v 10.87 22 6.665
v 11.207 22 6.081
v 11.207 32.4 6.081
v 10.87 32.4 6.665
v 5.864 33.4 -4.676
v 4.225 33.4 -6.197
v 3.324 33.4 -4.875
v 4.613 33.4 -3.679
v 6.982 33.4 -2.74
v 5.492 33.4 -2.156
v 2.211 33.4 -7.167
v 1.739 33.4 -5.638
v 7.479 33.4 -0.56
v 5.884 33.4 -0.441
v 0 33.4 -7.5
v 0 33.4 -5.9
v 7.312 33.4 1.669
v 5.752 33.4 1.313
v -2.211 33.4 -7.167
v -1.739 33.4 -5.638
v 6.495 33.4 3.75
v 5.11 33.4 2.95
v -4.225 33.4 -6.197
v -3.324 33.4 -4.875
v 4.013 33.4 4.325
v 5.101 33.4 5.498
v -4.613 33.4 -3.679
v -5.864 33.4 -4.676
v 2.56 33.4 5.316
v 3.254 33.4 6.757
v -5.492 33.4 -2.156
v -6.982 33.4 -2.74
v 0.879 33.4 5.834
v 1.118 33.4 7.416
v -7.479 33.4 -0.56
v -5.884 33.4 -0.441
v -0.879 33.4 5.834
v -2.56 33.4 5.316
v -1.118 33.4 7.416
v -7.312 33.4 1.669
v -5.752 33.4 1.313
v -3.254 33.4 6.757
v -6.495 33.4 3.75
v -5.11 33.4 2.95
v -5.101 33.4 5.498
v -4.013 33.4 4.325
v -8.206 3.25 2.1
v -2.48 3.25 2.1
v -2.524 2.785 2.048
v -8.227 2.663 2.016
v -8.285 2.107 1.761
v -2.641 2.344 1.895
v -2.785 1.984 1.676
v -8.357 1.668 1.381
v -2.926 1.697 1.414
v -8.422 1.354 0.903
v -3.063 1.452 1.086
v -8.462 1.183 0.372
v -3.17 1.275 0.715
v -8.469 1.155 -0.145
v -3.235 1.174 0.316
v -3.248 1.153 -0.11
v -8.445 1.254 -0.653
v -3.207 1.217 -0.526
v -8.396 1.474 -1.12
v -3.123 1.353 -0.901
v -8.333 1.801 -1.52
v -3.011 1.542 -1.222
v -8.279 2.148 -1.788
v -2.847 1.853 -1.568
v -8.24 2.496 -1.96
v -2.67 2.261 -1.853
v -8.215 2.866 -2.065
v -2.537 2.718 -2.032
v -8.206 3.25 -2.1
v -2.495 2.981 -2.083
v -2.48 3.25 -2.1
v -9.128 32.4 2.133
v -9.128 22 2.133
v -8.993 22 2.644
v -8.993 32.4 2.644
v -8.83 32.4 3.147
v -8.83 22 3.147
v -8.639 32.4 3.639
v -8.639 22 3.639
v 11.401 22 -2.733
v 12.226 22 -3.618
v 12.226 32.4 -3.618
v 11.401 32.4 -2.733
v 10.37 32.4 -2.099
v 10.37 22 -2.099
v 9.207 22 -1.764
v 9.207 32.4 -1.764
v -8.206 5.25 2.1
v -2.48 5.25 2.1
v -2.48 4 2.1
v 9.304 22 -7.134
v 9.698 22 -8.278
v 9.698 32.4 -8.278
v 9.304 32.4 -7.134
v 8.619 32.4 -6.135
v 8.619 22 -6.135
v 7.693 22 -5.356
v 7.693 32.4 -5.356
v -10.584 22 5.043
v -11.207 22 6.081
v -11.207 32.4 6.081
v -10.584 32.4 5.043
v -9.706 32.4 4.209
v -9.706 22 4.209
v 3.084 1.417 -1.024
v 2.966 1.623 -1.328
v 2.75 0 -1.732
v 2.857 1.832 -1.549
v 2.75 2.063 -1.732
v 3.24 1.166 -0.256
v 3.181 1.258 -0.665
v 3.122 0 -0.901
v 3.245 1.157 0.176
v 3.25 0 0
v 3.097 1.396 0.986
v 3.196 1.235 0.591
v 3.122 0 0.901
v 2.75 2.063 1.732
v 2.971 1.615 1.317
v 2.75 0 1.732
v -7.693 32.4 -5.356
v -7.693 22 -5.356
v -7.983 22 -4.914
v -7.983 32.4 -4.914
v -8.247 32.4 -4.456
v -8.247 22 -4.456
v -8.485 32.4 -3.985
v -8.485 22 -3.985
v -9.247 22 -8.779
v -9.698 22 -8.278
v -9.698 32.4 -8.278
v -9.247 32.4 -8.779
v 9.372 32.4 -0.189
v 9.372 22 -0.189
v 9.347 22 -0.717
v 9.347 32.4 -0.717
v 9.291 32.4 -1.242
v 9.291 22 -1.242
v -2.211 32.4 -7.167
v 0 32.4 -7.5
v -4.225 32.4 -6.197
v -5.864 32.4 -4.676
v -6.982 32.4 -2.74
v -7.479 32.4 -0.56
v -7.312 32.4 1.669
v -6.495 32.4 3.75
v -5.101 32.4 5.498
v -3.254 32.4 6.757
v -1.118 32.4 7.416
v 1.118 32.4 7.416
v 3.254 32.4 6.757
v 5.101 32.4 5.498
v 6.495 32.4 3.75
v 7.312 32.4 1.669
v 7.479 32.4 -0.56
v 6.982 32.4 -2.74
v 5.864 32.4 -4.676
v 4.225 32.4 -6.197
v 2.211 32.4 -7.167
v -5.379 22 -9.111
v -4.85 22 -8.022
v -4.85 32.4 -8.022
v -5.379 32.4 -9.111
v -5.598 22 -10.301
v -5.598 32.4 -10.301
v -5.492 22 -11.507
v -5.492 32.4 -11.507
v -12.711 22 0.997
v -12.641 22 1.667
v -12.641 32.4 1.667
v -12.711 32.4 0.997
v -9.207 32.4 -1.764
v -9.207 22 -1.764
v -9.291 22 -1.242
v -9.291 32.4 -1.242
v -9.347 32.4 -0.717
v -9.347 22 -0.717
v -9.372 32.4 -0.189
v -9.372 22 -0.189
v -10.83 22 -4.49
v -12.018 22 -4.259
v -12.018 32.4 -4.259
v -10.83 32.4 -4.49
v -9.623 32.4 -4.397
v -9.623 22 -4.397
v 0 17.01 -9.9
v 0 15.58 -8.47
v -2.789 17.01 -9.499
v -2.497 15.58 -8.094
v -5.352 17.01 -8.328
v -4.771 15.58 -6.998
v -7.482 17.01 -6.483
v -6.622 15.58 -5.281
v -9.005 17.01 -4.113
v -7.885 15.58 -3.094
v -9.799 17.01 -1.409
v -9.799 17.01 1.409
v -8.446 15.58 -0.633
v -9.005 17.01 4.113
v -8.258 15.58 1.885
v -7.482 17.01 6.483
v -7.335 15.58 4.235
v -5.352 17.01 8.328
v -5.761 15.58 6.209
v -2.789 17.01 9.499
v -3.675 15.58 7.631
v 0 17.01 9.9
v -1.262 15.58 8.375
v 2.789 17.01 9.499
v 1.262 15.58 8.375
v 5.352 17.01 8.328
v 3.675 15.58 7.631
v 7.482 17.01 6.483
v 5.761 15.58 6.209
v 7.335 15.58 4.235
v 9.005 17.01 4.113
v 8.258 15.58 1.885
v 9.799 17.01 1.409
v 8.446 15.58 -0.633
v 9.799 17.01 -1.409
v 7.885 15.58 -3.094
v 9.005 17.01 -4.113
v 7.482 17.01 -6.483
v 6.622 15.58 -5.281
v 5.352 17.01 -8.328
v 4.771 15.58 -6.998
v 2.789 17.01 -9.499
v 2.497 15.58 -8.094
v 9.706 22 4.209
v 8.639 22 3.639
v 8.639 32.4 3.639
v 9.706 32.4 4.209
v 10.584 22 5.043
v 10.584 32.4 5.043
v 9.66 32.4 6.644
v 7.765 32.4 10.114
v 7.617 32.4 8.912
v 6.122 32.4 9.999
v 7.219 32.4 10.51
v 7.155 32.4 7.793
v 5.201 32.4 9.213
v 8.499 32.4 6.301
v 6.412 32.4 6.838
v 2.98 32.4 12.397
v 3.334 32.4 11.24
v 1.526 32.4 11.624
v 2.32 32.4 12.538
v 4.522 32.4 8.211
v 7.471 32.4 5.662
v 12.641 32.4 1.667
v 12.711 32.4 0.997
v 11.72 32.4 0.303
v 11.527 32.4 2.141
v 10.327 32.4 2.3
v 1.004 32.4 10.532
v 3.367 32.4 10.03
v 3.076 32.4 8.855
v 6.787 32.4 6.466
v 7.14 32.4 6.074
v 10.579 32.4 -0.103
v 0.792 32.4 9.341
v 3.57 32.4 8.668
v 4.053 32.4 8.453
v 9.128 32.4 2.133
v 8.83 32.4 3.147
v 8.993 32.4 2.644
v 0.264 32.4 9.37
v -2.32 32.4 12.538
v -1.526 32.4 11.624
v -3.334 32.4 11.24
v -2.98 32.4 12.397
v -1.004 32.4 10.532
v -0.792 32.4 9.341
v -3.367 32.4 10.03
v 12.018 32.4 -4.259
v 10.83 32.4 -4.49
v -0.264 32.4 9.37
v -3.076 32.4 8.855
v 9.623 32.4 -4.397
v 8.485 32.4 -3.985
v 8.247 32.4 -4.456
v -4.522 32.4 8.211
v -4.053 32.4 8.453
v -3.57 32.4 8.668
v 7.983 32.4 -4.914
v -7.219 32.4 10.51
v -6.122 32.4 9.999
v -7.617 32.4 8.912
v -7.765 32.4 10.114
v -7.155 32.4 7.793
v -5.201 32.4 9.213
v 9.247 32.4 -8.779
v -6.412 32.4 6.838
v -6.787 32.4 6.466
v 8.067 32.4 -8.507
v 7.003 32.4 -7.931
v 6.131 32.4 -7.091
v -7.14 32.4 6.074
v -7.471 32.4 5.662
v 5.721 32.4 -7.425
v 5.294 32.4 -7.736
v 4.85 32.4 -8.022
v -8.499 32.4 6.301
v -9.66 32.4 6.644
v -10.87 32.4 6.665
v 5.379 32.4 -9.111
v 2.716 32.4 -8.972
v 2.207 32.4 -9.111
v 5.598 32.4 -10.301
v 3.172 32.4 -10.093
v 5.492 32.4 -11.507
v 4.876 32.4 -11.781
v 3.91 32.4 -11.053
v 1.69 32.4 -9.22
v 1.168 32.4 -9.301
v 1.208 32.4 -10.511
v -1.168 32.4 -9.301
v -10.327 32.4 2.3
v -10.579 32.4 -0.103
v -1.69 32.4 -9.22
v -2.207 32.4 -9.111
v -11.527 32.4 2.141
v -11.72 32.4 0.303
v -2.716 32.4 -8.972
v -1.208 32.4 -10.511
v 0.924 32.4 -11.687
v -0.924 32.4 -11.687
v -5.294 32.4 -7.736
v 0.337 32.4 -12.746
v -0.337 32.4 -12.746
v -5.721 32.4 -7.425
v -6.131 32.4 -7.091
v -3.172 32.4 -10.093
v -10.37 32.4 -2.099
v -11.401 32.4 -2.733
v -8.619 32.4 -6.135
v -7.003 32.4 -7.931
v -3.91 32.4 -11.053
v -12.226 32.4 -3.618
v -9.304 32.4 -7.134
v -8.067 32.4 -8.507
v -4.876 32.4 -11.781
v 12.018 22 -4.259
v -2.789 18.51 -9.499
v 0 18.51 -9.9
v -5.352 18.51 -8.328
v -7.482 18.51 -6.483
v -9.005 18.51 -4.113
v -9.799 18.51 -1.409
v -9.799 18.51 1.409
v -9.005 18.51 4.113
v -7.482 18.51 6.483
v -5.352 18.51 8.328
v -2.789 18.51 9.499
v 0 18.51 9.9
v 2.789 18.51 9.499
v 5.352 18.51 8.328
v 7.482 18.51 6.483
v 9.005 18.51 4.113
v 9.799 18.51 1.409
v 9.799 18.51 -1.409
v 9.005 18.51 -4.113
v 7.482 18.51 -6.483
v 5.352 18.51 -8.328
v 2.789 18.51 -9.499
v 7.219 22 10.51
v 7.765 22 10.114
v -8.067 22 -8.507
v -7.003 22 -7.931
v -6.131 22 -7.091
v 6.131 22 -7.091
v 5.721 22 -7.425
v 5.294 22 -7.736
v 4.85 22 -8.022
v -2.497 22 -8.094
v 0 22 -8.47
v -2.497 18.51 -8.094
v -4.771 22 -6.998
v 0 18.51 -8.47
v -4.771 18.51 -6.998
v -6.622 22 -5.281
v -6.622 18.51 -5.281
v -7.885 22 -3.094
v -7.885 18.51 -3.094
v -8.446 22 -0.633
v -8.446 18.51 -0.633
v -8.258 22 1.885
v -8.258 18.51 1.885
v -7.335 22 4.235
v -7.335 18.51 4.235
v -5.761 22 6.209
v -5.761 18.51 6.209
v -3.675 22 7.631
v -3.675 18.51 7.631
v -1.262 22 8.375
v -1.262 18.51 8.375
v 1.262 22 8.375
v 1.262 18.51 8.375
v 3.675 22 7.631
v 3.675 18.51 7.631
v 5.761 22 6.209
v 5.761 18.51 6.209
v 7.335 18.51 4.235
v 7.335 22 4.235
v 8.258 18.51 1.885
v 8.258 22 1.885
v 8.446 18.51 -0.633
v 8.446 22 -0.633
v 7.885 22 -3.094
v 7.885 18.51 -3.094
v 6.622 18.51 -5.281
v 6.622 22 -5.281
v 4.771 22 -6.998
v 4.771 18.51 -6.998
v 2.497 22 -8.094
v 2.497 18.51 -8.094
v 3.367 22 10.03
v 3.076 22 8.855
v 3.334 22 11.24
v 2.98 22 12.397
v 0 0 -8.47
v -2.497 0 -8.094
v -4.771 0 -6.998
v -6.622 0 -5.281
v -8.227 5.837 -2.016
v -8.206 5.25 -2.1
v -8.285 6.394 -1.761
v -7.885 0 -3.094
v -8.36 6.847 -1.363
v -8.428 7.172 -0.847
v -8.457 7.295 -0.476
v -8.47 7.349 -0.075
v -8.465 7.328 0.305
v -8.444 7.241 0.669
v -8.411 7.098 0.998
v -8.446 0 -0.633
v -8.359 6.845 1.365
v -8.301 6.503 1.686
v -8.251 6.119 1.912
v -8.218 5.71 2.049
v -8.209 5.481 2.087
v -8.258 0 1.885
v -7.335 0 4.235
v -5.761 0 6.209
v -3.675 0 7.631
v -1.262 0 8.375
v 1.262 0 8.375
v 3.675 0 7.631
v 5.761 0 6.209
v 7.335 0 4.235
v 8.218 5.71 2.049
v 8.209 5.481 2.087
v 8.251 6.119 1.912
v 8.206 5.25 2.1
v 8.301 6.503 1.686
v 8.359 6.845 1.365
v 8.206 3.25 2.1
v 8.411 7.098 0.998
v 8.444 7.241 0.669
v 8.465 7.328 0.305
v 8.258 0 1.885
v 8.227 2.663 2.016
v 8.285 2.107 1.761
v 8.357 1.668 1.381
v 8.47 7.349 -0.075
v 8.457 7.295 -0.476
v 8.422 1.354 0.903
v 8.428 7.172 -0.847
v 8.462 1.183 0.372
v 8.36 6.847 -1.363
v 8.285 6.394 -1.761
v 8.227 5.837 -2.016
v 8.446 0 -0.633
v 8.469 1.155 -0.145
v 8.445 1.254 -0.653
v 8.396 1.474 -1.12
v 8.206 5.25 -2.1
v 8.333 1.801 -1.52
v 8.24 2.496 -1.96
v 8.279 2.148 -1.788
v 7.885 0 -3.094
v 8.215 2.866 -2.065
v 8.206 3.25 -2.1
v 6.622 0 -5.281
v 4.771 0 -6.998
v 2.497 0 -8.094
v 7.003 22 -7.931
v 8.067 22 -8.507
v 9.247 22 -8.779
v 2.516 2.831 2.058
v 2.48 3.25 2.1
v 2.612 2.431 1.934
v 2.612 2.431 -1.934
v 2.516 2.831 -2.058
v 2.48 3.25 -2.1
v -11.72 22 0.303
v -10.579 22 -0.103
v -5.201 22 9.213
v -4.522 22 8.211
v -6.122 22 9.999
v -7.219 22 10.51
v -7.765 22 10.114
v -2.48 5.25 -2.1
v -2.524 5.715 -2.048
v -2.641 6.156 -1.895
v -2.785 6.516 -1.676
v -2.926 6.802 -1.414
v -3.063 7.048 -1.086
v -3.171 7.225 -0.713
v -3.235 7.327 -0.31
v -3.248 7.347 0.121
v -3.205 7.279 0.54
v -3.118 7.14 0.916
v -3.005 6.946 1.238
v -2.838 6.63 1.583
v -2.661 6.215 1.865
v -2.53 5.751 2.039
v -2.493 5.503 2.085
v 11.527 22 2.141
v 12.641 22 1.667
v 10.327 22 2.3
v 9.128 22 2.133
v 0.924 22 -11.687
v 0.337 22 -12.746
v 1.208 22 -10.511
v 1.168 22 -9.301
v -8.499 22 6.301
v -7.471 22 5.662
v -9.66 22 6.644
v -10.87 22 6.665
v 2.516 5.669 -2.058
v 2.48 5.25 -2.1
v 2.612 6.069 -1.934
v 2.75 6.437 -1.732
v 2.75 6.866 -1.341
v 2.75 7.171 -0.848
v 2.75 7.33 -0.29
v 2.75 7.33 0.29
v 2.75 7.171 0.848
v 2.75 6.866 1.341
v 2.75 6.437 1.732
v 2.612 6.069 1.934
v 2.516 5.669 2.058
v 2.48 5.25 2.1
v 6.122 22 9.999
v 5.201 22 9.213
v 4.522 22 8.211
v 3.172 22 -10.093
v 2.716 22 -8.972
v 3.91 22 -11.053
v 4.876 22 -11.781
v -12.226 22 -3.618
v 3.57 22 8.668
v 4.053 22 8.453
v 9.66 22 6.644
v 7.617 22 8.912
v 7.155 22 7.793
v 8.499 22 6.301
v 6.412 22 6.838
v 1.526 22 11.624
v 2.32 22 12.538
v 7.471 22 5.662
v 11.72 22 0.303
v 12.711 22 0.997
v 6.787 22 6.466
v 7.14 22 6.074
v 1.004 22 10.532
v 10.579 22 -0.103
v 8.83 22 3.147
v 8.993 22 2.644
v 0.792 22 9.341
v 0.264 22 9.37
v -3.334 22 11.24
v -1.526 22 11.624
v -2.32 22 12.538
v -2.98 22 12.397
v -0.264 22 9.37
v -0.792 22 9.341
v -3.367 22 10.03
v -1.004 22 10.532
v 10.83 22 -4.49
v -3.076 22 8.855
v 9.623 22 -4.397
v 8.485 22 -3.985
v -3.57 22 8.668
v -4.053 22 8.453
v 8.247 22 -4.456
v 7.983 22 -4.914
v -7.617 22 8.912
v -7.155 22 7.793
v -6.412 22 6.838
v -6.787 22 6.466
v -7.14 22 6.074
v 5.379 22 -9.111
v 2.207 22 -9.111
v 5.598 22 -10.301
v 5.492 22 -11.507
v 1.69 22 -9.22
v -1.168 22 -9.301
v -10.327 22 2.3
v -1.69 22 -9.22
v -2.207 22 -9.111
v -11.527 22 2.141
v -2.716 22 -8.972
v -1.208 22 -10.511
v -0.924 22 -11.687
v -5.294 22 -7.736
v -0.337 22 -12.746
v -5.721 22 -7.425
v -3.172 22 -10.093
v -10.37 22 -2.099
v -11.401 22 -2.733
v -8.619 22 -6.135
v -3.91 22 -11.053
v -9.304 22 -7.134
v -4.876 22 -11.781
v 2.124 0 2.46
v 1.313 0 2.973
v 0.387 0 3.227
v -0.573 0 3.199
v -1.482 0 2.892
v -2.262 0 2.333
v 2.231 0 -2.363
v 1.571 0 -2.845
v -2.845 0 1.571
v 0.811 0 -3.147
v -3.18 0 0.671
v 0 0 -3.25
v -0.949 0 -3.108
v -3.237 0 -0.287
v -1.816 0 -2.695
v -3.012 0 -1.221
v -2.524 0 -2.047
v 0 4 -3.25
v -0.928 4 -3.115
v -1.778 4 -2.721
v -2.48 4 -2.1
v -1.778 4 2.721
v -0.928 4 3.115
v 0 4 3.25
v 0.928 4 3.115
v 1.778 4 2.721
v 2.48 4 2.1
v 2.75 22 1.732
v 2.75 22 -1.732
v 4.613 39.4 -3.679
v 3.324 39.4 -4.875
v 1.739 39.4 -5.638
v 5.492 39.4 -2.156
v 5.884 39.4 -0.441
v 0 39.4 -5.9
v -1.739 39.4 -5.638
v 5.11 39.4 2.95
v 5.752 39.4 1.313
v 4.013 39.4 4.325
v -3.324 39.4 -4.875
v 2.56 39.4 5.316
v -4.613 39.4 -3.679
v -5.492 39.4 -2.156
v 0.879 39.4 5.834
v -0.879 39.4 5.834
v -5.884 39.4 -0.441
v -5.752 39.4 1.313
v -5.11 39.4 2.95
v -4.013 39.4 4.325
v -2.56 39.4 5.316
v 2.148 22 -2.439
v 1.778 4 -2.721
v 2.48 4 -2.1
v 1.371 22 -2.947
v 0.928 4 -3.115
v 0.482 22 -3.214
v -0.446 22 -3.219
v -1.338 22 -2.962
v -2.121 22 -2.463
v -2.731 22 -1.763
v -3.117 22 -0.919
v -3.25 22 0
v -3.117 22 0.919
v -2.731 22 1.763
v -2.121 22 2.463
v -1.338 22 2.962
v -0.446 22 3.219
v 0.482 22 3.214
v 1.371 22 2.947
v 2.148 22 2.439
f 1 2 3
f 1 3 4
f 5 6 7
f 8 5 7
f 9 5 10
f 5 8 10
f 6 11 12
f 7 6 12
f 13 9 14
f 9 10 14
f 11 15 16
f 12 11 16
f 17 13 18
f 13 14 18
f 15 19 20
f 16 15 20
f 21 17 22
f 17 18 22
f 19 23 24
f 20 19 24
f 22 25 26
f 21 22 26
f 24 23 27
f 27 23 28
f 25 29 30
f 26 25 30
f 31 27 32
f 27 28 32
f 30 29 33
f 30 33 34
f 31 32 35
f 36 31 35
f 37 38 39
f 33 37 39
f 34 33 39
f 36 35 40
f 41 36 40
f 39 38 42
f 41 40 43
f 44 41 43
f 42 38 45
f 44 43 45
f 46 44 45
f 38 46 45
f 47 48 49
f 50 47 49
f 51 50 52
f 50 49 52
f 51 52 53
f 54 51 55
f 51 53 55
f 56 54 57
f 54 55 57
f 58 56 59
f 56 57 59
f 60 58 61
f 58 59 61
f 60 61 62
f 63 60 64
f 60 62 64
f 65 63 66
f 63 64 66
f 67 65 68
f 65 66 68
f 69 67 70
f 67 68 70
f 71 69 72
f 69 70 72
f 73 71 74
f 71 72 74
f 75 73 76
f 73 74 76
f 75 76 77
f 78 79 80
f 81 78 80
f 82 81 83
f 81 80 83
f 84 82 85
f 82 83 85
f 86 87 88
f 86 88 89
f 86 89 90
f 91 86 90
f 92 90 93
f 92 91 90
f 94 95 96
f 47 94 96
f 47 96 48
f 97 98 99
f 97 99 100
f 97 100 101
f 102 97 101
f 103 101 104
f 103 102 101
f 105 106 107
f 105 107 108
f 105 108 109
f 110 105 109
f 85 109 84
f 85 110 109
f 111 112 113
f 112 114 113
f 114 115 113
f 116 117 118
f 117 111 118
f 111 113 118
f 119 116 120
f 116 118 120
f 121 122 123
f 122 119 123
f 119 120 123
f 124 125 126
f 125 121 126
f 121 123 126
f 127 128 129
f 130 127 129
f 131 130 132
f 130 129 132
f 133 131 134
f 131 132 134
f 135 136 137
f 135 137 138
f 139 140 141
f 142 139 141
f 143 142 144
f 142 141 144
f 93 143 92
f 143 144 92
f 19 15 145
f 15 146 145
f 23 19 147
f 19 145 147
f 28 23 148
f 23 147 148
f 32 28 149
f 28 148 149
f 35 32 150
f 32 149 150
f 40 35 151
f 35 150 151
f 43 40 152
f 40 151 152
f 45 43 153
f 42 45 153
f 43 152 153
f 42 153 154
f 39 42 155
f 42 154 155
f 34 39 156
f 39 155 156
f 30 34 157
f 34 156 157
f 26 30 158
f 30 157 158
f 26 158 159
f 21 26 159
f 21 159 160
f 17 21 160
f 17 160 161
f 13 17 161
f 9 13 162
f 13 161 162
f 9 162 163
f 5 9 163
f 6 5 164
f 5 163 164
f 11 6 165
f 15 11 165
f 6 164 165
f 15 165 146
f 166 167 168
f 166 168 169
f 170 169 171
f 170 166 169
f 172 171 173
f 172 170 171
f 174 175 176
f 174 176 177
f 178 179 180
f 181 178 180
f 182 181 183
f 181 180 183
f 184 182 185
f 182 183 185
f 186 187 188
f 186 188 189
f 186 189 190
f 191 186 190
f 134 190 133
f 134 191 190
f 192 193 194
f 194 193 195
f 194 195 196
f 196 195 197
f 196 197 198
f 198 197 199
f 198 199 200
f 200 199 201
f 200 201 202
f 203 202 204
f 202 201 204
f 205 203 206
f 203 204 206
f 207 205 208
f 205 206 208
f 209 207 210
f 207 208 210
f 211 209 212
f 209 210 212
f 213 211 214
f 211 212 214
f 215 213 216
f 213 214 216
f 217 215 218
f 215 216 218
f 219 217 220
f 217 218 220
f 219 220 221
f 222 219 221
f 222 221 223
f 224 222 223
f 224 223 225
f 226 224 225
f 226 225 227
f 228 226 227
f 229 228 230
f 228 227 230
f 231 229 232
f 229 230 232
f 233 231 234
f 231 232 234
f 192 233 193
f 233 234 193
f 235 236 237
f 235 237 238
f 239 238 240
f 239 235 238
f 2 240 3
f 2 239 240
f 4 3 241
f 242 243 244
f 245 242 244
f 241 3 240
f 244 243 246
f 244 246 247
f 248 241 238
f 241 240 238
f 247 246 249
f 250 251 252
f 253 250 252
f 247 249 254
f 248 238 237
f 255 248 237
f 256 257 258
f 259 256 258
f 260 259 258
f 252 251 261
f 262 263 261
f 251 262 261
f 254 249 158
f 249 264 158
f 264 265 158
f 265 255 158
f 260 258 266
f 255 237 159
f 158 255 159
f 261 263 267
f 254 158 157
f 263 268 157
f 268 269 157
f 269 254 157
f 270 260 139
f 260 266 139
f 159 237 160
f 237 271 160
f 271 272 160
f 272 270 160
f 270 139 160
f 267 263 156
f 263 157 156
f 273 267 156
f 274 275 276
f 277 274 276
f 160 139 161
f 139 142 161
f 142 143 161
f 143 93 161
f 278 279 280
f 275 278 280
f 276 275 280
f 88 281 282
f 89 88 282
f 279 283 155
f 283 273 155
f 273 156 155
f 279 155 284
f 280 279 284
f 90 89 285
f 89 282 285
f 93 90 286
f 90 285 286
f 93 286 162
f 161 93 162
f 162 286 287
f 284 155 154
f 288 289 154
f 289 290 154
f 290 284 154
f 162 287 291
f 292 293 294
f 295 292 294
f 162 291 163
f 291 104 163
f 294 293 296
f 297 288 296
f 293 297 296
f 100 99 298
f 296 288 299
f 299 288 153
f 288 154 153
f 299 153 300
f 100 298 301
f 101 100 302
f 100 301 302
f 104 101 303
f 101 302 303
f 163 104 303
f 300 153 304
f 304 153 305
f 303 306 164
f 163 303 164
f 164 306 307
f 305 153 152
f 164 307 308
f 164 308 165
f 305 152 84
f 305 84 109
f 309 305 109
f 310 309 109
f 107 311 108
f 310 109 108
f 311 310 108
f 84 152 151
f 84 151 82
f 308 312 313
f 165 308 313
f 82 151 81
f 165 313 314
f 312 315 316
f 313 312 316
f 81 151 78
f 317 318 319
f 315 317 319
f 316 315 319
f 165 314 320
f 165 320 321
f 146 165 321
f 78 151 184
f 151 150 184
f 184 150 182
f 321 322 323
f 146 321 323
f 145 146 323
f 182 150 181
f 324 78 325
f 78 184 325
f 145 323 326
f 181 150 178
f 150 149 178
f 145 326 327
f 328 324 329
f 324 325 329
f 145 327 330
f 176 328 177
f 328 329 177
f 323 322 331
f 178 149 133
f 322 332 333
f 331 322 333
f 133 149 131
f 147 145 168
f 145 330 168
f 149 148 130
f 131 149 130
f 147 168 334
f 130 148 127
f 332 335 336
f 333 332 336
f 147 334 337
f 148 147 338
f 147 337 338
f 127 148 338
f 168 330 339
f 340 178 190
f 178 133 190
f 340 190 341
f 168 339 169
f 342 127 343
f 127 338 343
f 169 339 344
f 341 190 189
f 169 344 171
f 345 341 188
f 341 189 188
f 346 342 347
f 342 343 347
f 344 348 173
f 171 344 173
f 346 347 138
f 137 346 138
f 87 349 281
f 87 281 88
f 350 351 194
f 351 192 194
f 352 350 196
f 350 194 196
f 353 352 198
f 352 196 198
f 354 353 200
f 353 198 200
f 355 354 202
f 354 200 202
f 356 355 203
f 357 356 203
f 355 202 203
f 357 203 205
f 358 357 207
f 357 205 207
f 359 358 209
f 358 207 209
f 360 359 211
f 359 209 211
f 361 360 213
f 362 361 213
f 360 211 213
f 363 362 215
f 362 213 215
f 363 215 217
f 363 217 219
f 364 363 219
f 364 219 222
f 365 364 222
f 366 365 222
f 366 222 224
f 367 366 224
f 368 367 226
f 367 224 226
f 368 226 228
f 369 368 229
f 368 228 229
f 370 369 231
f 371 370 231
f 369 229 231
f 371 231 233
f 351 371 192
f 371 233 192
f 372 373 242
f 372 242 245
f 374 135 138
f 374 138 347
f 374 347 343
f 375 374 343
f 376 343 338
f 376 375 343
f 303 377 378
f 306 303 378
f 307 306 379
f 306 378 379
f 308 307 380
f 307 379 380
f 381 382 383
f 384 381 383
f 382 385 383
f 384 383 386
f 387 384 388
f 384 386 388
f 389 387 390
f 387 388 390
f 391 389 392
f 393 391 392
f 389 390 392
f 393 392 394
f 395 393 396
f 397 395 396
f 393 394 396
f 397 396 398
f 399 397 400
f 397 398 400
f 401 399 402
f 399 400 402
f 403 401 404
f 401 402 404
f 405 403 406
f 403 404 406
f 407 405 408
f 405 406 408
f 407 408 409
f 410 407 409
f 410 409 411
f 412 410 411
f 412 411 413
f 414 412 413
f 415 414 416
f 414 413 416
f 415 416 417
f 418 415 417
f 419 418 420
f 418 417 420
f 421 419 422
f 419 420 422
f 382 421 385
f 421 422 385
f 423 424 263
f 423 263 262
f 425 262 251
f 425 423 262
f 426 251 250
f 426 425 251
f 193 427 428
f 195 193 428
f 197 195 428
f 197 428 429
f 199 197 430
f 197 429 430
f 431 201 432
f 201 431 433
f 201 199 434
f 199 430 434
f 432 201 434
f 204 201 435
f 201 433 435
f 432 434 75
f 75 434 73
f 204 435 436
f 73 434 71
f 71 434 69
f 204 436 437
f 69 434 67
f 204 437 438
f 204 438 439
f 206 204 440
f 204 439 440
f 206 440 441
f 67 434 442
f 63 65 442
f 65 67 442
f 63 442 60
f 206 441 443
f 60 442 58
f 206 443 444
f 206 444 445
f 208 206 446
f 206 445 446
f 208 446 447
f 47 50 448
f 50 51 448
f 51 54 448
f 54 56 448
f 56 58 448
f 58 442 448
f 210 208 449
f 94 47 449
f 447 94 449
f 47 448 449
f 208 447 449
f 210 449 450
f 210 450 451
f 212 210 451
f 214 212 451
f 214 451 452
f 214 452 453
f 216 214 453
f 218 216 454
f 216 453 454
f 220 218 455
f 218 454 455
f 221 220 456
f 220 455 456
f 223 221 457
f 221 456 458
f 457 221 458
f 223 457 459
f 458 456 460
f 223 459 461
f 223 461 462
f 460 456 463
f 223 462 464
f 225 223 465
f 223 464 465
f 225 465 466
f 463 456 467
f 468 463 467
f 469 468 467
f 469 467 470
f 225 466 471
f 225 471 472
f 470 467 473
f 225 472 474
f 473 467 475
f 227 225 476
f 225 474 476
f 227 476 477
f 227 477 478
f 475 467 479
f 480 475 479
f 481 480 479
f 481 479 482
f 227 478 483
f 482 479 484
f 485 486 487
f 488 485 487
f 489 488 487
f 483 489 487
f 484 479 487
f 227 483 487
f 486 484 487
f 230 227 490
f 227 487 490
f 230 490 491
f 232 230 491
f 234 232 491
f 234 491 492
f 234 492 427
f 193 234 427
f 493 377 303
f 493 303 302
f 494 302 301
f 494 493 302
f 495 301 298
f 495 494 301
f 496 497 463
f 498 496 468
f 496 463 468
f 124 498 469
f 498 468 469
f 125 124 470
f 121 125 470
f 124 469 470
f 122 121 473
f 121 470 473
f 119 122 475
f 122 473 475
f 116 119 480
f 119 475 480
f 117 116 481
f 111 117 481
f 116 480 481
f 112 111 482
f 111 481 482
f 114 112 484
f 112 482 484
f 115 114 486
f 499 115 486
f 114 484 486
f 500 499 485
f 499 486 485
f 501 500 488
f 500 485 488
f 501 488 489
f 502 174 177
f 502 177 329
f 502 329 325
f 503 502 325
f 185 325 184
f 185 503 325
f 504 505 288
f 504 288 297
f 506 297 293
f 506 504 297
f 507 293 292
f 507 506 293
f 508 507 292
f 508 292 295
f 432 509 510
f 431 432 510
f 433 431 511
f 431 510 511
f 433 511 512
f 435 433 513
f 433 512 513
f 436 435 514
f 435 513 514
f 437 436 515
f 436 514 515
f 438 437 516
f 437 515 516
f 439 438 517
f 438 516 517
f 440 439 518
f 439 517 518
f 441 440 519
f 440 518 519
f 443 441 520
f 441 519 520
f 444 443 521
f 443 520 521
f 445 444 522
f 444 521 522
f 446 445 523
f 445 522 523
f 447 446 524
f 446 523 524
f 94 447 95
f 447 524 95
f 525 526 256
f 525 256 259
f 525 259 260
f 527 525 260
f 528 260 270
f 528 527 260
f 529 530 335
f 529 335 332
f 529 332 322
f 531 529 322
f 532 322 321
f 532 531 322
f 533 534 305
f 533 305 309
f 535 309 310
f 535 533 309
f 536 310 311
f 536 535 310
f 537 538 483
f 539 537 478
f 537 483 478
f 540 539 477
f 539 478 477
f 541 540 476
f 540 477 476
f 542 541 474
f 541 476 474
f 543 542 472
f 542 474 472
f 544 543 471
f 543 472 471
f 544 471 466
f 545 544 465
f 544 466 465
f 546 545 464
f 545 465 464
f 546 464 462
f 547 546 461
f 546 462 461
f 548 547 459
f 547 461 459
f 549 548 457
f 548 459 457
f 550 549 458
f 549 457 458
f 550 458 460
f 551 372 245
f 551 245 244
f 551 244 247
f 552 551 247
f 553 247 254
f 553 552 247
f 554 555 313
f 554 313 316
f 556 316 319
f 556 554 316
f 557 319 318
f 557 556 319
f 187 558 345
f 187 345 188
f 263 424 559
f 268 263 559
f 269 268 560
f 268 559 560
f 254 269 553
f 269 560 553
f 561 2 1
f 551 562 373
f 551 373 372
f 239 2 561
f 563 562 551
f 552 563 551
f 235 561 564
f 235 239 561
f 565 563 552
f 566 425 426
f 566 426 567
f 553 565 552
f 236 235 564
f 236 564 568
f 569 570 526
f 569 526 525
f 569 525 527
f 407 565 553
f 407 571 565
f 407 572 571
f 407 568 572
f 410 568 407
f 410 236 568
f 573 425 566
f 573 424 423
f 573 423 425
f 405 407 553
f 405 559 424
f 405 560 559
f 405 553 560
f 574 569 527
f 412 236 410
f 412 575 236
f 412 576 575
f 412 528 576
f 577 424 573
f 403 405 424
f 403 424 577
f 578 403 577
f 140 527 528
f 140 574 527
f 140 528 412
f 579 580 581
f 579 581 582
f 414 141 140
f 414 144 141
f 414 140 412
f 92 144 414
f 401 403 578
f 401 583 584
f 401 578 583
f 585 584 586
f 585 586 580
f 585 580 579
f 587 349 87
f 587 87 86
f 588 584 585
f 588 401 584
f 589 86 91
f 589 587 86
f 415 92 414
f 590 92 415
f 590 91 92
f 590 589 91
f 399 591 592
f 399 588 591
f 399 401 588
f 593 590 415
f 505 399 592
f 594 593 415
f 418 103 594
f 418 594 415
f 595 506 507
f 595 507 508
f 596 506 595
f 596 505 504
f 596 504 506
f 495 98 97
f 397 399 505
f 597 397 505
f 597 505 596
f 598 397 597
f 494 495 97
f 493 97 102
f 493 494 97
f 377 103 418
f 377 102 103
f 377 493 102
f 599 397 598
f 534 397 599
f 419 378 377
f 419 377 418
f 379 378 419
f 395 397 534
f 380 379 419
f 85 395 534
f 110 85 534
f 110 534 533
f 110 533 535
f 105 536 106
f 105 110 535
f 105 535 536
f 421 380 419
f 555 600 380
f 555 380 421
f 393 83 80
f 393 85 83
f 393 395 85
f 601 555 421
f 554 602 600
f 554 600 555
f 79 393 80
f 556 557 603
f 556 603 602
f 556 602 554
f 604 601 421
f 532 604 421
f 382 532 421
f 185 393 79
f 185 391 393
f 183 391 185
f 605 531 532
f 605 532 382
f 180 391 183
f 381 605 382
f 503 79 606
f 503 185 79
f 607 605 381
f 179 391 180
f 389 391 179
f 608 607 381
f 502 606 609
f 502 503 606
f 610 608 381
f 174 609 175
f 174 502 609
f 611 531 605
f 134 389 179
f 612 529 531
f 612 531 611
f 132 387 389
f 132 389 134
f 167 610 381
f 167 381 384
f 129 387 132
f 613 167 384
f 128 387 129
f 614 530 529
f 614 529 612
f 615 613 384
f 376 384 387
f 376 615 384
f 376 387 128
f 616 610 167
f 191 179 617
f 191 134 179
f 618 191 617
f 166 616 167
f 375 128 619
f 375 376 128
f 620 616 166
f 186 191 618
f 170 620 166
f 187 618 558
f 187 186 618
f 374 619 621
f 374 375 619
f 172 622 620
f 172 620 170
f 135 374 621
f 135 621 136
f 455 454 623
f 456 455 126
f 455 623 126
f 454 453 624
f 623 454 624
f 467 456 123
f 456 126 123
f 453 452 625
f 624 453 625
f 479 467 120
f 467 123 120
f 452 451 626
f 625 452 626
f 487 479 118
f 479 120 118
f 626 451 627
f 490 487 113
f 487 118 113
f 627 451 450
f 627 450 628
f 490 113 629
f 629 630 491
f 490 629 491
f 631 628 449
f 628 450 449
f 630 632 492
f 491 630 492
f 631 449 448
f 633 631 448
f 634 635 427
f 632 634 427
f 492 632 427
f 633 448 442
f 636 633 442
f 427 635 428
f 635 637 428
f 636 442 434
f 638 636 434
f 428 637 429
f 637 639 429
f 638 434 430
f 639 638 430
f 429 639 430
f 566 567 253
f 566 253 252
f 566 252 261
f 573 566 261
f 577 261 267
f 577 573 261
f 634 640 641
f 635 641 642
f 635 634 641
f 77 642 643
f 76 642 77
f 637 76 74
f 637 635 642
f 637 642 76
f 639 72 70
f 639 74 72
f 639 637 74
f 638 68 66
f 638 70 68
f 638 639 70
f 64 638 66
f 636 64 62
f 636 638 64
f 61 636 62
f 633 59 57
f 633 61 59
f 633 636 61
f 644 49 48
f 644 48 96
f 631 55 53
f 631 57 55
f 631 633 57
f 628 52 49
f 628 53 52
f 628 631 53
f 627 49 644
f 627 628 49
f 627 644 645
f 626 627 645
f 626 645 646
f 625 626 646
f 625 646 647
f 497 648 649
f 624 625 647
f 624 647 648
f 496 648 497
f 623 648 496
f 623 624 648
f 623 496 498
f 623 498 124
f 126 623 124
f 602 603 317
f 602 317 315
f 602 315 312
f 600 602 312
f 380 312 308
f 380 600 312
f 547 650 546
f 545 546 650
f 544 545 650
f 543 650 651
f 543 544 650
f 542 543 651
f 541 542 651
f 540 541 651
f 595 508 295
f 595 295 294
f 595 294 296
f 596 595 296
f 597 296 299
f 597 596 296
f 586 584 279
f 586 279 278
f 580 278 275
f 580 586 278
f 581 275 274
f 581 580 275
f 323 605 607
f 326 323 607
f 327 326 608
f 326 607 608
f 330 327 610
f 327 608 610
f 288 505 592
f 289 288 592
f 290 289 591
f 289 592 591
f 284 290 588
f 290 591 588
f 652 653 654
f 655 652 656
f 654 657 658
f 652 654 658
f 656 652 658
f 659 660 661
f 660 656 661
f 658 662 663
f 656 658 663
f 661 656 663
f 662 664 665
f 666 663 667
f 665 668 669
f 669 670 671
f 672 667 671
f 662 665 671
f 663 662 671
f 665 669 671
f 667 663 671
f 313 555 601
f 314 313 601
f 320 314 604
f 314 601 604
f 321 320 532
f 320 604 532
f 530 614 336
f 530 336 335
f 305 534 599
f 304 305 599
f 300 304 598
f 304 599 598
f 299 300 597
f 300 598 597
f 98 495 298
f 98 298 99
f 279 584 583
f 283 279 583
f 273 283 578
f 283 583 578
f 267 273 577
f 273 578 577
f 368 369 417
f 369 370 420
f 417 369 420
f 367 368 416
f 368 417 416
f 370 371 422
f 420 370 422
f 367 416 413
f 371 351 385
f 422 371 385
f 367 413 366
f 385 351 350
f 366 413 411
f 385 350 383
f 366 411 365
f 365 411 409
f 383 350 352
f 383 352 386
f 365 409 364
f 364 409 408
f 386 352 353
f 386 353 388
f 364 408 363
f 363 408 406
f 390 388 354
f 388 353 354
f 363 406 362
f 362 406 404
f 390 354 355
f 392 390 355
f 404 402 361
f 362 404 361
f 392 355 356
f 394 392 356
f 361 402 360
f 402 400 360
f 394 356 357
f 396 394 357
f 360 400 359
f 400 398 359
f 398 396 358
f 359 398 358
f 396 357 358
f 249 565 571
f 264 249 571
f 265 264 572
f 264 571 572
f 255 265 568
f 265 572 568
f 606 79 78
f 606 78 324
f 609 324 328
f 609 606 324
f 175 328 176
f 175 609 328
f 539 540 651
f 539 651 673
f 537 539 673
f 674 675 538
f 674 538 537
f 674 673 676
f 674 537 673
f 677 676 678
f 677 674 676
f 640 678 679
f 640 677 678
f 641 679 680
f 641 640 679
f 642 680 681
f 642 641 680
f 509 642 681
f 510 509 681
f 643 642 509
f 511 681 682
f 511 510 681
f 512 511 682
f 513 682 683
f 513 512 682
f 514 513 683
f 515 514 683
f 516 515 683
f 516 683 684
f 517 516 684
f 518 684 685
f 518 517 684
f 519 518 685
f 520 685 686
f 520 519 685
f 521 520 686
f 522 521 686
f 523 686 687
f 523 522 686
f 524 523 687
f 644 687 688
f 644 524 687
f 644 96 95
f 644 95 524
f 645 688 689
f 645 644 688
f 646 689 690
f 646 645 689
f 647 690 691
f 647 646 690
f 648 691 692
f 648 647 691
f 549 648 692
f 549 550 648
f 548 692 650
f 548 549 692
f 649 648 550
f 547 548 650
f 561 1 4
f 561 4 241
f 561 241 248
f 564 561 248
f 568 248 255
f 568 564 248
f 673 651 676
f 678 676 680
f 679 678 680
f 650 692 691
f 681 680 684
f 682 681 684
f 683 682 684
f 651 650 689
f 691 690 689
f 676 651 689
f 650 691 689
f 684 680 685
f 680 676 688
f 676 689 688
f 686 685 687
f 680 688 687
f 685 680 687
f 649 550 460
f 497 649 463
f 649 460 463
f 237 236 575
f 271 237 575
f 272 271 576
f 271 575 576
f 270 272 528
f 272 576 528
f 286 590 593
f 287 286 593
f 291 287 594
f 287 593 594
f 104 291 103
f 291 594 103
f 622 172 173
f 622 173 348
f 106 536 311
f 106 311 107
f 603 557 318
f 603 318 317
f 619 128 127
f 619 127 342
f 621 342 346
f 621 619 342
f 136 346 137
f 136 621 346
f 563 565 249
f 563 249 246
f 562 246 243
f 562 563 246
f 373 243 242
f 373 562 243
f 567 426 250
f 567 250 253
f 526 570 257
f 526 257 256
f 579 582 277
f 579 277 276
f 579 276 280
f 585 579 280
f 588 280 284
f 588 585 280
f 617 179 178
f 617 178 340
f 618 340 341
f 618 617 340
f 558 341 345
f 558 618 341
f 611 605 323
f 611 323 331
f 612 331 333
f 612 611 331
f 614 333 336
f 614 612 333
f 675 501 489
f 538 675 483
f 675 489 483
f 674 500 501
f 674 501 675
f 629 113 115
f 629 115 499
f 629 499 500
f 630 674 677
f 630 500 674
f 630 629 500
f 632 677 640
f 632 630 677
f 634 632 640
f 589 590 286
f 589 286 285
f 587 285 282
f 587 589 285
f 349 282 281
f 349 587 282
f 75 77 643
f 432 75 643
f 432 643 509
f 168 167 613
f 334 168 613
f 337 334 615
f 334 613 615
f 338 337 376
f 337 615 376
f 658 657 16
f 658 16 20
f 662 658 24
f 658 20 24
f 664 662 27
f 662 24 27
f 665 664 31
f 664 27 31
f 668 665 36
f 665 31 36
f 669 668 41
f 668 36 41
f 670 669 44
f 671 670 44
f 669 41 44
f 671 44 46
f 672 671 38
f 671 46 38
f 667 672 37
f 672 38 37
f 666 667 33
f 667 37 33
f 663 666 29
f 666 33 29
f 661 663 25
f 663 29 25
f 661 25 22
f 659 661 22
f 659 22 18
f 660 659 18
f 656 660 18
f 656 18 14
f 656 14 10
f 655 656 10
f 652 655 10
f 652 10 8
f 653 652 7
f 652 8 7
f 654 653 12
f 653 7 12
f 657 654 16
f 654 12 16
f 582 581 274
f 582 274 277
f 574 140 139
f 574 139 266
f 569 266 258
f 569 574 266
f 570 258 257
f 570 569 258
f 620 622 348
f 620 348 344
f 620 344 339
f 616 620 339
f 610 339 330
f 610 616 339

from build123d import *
from build123d.topology import SkipClean

# Parameters (mm, degrees)
RESSALTO_EXTRUS_O1_START = -10.4
RESSALTO_EXTRUS_O1_DEPTH = 10.4
PADR_OCIRCULAR1_COUNT    = 15
CORTE_EXTRUS_O1_DEPTH    = 22
ESBO_O4_R                = 3.25
CORTE_EXTRUS_O2_DEPTH    = 4
CORTE_EXTRUS_O4_DEPTH    = 20


with BuildPart() as part:
    # Esboço1 → Revolução1 (revolve)
    with BuildSketch(Plane.XY, mode=Mode.PRIVATE) as revolu_o1_sk:
        Polygon((0, 0), (0, 39.4), (5.9, 39.4), (5.9, 33.4), (7.5, 33.4), (7.5, 32.4), (9.374, 32.4), (9.374, 22), (8.47, 22), (8.47, 18.51), (9.9, 18.51), (9.9, 17.01), (8.47, 15.58), (8.47, 0), align=None)
    revolve(revolu_o1_sk.sketch.rotate(Axis((0, 0, 0), (0, 1, 0)), 90), axis=Axis((0, 0, 0), (0, 1, 0)))

    # Esboço2 → Ressalto-extrusão1 (add)
    with BuildSketch(Plane(origin=(0, 32.4, 0), x_dir=(1, 0, 0), z_dir=(0, 1, 0)).offset(RESSALTO_EXTRUS_O1_START)):
        with BuildLine():
            Line((-0.337, 12.746), (0.337, 12.746))
            ThreePointArc((0.337, 12.746), (1.105703178, 11.108702403), (1.167644885, 9.300993572))
            ThreePointArc((1.167644885, 9.300993572), (0, 9.374), (-1.167644885, 9.300993572))
            ThreePointArc((-1.167644885, 9.300993572), (-1.105703178, 11.108702403), (-0.337, 12.746))
        make_face()
    ressalto_extrus_o1 = extrude(amount=RESSALTO_EXTRUS_O1_DEPTH)

    # PadrãoCircular1: Ressalto-extrusão1 ×15 about axis
    padr_ocircular1_axis = Axis((0, 0, 0), (0, 1, 0))
    for i in range(1, PADR_OCIRCULAR1_COUNT):
        add(ressalto_extrus_o1.rotate(padr_ocircular1_axis, i * 360 / PADR_OCIRCULAR1_COUNT))

    # Esboço3 → Corte-extrusão1 (cut)
    with BuildSketch(Plane.XZ):
        with BuildLine():
            Line((2.75, 1.732050808), (2.75, -1.732050808))
            ThreePointArc((2.75, -1.732050808), (-3.25, 0), (2.75, 1.732050808))
        make_face()
    extrude(amount=-CORTE_EXTRUS_O1_DEPTH, mode=Mode.SUBTRACT)

    # Esboço4 → Corte-extrusão2 (cut)
    with SkipClean():  # the faces are left unmerged after this step: merging them gives an invalid solid
        with BuildSketch(Plane.XZ):
            with Locations(Location((0, 0, 0), (0, 0, 270))):
                Circle(ESBO_O4_R)
        extrude(amount=-CORTE_EXTRUS_O2_DEPTH, mode=Mode.SUBTRACT)

    # Esboço7 → Corte-extrusão4 (cut, symmetric)
    with SkipClean():  # the faces are left unmerged after this step: merging them gives an invalid solid
        with BuildSketch(Plane(origin=(0, 0, 0), x_dir=(0, 0, -1), z_dir=(1, 0, 0))):
            with BuildLine():
                Line((-2.1, 5.25), (-2.1, 3.25))
                ThreePointArc((-2.1, 3.25), (0, 1.15), (2.1, 3.25))
                Line((2.1, 3.25), (2.1, 5.25))
                ThreePointArc((2.1, 5.25), (0, 7.35), (-2.1, 5.25))
            make_face()
        extrude(amount=CORTE_EXTRUS_O4_DEPTH, both=True, mode=Mode.SUBTRACT)


solid = part.part
